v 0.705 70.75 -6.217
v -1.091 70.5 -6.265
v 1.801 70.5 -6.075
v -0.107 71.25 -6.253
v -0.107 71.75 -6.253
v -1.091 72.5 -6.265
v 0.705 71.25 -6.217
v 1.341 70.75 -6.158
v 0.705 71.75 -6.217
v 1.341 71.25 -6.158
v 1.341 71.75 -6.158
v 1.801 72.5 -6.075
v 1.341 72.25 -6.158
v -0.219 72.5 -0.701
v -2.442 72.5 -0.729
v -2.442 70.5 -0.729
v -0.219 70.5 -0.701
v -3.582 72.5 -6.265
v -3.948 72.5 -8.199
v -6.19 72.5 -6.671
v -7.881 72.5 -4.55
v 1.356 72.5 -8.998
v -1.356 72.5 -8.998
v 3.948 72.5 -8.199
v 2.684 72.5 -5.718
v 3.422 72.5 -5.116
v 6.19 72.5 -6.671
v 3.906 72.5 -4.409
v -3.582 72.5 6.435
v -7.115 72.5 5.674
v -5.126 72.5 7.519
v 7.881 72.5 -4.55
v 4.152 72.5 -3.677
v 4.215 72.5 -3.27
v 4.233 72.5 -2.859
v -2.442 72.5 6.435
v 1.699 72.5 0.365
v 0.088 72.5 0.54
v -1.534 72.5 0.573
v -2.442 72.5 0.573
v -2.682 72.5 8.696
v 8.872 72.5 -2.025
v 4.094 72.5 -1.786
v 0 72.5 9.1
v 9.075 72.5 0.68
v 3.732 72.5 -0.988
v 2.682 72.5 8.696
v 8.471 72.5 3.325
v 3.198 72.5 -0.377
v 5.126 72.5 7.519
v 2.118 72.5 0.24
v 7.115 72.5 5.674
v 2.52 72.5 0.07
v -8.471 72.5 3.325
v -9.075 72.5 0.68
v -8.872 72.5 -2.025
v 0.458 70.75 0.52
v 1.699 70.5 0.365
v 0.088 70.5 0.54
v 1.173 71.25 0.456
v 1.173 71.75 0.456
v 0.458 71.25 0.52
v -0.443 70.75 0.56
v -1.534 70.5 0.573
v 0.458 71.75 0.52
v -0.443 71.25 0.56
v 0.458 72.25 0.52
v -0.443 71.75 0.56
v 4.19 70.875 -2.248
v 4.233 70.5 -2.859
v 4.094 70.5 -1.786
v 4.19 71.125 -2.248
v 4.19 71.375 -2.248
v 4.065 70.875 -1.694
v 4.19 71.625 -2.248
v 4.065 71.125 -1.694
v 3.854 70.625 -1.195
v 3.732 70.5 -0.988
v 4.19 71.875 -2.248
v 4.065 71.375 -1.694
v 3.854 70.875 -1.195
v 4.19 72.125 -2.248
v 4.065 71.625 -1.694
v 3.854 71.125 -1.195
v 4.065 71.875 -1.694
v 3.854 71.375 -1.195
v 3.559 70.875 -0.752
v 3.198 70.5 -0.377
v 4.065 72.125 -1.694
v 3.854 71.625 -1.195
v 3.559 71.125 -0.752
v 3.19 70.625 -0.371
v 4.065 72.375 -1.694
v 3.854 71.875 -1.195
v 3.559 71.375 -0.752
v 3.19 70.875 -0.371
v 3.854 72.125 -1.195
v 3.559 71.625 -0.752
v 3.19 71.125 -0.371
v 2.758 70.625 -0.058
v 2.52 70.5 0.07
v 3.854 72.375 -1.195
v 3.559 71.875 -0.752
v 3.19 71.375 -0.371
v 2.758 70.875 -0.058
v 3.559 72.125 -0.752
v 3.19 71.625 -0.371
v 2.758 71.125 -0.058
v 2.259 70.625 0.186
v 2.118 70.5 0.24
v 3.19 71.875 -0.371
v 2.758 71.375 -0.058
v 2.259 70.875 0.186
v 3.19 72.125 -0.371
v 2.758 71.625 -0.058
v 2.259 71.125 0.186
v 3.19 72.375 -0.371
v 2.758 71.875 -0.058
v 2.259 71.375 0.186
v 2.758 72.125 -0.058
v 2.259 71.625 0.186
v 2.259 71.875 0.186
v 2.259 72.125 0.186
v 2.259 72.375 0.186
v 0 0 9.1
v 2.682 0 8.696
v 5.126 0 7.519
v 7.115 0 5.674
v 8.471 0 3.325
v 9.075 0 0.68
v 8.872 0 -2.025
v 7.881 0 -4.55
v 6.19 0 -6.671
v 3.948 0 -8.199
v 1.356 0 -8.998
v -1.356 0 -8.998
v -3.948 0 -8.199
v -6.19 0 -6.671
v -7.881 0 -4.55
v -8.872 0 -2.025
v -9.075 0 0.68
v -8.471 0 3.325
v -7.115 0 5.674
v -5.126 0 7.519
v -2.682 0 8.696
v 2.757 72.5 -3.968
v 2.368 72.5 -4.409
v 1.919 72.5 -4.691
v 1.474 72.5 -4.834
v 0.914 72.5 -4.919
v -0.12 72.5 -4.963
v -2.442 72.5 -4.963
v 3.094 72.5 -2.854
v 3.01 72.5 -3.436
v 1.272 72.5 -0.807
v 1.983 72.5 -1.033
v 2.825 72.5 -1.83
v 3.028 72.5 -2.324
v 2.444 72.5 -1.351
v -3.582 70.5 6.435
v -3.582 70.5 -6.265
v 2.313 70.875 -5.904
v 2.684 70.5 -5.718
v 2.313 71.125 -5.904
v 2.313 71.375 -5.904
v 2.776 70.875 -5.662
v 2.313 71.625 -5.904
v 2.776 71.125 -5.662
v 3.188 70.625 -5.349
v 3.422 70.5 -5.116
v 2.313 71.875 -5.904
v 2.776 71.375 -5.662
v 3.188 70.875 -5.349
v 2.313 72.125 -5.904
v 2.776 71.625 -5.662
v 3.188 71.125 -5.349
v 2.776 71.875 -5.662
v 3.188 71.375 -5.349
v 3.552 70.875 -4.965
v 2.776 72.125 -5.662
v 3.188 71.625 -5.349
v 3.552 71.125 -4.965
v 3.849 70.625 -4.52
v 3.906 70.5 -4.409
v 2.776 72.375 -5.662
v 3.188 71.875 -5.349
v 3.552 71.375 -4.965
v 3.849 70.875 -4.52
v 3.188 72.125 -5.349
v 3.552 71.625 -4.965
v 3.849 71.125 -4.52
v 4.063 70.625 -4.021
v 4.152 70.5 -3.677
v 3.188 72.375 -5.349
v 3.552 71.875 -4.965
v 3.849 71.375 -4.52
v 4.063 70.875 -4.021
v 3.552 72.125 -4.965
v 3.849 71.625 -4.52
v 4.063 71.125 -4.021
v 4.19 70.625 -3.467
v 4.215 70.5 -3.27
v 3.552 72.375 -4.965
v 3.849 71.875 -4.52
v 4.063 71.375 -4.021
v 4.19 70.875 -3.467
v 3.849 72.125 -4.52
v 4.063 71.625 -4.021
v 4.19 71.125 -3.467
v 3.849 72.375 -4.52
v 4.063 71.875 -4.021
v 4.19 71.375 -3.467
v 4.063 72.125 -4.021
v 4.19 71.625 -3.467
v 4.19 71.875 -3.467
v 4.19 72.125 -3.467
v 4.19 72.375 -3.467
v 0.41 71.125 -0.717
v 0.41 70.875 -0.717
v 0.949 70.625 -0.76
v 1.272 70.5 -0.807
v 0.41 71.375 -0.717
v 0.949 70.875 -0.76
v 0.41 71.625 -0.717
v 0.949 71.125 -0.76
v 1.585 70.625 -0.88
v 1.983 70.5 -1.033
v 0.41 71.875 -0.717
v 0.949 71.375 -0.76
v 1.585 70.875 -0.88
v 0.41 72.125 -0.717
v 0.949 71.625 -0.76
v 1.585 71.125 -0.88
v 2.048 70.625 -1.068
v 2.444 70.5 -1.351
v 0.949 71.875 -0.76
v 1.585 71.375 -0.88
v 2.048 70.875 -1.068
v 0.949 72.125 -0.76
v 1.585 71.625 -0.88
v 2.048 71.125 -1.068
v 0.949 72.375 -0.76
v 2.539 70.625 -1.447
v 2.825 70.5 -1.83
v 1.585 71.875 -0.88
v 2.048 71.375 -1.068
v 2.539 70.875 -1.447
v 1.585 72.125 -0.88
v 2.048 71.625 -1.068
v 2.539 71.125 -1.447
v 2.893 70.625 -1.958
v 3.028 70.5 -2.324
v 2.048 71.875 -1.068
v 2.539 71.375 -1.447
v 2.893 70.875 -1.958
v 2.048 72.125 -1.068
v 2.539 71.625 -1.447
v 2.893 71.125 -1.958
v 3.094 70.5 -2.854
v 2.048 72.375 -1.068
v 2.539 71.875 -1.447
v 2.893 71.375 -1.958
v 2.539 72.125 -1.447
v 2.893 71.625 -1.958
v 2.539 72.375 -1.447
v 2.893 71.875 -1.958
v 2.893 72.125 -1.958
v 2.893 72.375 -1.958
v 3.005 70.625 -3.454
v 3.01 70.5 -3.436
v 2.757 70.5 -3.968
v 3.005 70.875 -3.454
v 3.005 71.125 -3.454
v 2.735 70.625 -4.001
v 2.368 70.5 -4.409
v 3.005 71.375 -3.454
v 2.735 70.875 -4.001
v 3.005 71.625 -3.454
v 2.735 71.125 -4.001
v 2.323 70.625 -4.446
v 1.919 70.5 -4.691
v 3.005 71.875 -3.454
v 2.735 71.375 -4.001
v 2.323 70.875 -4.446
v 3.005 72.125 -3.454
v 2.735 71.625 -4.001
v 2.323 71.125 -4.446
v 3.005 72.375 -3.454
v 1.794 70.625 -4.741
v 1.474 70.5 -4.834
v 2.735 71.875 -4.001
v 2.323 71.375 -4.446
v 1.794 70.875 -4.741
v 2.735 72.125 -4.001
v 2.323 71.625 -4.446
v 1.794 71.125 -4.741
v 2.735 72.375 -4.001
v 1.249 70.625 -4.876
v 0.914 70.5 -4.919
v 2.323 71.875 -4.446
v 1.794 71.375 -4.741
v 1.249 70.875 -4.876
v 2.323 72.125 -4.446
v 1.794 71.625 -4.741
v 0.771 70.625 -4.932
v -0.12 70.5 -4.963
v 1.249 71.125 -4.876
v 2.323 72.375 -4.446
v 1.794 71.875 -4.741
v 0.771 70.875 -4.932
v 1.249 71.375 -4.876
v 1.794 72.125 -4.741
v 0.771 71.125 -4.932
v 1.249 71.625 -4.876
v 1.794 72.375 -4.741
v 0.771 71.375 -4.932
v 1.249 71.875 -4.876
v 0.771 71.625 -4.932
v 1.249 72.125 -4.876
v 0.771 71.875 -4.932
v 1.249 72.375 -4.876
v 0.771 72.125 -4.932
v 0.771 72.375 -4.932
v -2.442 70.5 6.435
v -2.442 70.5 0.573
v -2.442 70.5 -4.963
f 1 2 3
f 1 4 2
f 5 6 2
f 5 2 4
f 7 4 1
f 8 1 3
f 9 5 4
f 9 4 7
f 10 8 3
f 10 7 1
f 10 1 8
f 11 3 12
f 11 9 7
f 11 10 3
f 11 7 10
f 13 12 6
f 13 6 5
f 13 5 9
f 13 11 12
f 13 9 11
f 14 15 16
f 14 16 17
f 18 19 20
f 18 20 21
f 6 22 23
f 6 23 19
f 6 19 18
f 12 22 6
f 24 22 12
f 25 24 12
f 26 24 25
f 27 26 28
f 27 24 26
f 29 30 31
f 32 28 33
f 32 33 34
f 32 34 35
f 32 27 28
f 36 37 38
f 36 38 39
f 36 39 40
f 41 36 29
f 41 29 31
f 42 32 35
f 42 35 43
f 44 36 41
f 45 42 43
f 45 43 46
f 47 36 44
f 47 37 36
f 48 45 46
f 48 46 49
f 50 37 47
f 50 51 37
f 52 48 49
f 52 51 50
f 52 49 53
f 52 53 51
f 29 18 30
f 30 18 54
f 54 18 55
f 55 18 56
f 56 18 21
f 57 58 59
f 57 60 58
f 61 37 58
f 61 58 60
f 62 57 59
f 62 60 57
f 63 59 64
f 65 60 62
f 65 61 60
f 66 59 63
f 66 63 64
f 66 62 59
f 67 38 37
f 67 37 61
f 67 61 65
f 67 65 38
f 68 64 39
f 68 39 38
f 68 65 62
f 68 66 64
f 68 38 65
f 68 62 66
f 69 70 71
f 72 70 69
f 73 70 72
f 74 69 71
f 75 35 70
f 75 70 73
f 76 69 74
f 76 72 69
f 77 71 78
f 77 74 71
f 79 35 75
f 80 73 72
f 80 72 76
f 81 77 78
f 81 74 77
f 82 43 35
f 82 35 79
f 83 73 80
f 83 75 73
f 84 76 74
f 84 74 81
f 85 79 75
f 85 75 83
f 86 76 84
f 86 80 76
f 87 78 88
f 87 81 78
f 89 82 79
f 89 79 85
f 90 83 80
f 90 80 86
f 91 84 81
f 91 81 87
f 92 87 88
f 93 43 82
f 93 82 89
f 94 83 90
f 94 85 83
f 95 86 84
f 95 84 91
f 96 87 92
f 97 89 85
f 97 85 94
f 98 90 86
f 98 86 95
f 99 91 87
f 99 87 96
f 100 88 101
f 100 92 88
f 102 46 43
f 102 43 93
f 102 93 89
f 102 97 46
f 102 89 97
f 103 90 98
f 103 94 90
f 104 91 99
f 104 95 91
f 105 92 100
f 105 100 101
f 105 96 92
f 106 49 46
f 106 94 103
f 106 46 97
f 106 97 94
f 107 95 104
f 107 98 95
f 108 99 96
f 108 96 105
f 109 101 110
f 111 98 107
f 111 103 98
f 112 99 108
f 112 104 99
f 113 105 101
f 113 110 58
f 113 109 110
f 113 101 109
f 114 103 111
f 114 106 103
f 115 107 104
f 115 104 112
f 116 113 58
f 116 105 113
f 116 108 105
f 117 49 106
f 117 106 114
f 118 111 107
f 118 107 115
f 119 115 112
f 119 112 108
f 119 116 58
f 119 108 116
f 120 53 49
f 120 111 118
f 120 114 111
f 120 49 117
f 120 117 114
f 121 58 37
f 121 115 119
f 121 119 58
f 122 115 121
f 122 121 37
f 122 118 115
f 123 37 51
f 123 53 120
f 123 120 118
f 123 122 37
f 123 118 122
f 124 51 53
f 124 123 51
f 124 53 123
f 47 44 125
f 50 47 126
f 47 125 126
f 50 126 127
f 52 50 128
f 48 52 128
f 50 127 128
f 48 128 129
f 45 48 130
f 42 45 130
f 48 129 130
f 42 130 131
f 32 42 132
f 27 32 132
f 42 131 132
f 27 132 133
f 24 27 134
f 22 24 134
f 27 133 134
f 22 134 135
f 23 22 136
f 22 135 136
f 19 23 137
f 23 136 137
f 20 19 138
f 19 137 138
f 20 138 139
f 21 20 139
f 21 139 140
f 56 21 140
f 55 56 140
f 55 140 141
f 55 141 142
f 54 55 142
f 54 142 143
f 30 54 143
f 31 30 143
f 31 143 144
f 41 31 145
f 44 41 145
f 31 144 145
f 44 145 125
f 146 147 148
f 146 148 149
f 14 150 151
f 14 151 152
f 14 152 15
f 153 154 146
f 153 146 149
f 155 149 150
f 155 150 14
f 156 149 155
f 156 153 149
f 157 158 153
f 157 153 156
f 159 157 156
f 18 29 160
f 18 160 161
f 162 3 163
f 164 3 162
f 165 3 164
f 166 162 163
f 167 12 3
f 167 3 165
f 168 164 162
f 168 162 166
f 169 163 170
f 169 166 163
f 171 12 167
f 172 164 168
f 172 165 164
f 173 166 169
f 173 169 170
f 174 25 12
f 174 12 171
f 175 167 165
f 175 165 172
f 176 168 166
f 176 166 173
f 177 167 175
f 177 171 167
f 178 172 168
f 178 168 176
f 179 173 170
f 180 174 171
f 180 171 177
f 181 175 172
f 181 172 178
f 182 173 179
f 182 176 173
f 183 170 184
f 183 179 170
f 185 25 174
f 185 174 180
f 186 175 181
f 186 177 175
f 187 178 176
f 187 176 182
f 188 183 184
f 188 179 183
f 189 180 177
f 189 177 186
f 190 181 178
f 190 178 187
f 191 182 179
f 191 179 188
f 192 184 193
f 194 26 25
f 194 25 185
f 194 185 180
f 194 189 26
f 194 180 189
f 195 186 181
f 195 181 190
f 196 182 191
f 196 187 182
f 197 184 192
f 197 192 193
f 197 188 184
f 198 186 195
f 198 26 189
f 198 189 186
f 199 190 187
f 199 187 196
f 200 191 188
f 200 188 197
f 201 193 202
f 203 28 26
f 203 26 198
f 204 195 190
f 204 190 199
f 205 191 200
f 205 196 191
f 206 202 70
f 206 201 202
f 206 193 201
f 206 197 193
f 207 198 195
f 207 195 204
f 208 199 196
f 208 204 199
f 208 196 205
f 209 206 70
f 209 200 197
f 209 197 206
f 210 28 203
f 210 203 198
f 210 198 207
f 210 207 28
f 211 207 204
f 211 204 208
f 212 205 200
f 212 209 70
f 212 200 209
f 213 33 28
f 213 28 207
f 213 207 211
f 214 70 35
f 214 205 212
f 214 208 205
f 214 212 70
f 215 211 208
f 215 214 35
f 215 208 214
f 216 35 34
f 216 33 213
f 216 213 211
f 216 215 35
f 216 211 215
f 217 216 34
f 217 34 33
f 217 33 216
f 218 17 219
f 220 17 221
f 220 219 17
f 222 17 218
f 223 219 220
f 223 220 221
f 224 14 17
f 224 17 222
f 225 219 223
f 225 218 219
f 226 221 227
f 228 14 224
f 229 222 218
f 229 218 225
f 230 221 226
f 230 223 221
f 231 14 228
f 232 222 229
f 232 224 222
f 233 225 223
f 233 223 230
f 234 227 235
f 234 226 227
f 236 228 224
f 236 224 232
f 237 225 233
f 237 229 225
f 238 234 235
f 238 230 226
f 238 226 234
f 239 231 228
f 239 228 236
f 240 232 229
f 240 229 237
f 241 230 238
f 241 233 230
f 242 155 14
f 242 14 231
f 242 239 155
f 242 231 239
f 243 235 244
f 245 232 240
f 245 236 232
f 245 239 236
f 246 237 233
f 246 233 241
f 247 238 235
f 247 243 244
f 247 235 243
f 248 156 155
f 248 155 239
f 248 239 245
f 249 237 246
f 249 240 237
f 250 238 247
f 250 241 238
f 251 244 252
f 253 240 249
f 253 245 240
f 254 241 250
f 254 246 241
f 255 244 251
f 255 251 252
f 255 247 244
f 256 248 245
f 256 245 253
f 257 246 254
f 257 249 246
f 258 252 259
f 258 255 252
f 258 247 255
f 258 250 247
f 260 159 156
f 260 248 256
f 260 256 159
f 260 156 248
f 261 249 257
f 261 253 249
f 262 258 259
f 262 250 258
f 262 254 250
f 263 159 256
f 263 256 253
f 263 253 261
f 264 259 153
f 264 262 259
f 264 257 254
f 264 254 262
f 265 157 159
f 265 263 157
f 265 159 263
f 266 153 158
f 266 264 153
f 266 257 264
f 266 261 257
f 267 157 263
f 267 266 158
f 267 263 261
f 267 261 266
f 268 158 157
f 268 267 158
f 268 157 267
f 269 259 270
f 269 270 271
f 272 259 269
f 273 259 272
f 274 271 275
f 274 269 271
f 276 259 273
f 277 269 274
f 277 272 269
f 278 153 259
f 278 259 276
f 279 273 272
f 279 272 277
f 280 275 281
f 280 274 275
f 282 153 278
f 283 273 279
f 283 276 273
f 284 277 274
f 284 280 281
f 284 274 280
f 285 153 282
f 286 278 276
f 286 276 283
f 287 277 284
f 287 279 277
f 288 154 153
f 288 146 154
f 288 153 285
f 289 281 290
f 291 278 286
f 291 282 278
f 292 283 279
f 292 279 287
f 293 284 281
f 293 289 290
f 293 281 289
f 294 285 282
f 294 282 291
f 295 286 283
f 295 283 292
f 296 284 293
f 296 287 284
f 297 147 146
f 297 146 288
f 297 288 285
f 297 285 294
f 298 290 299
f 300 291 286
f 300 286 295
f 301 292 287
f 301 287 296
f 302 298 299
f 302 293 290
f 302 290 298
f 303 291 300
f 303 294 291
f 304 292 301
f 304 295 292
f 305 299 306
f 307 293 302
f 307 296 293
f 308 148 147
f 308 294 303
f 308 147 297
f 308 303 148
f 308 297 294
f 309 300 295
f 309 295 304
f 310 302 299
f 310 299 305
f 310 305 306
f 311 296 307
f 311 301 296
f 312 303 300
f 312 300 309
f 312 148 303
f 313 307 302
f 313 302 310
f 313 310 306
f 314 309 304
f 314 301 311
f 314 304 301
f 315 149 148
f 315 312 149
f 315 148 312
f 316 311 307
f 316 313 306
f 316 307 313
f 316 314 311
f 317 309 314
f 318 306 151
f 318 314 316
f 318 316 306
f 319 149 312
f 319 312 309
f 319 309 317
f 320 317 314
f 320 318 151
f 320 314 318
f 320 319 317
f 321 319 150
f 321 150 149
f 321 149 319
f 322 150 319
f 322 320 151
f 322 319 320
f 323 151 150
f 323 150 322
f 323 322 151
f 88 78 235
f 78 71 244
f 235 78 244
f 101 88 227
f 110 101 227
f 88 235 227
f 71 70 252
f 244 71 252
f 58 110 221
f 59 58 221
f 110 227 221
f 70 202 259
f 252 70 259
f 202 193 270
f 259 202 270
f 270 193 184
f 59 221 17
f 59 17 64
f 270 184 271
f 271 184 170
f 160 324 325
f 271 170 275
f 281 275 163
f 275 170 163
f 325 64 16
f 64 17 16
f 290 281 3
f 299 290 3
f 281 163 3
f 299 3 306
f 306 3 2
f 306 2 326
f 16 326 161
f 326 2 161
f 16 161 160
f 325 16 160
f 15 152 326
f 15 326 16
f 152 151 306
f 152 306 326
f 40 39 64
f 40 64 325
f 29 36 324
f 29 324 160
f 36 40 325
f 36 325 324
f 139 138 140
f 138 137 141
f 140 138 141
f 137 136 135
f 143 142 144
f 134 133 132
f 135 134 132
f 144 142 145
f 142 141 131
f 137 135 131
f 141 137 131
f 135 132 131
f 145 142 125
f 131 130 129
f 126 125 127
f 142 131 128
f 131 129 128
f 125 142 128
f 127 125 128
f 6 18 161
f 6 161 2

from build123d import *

# Parameters (mm, degrees)
SKETCH1_R           = 9.1
BOSS_EXTRUDE1_DEPTH = 72.5
CUT_EXTRUDE2_DEPTH  = 2


with BuildPart() as part:
    # Sketch1 → Boss-Extrude1 (new body)
    with BuildSketch(Plane(origin=(0, 0, 0), x_dir=(1, 0, 0), z_dir=(0, 1, 0))):
        with Locations(Location((0, 0, 0), (0, 0, 270))):
            Circle(SKETCH1_R)
    extrude(amount=BOSS_EXTRUDE1_DEPTH)

    # Sketch3 → Cut-Extrude2 (cut)
    with BuildSketch(Plane(origin=(0, 72.5, 0), x_dir=(1, 0, 0), z_dir=(0, 1, 0))):
        with BuildLine():
            Line((-3.582051282, 6.265328291), (-1.09140625, 6.265328291))
            add(Edge.make_bspline(
                [(-1.09140625, 6.265328291), (-0.920098105, 6.265139982), (-0.591864091, 6.264779173), (-0.121183746, 6.253839953), (0.30629728, 6.239228813), (0.689657234, 6.218974515), (1.030075647, 6.195038316), (1.326012134, 6.16146663), (1.57979281, 6.126413557), (1.731853355, 6.090775882), (1.801201923, 6.074523003)],
                knots=[0, 0, 0, 0, 1.415646017, 2.712440637, 3.8905458, 4.950247383, 5.884950622, 6.709939814, 7.411656543, 8, 8, 8, 8], degree=3))
            add(Edge.make_bspline(
                [(1.801201923, 6.074523003), (1.888989889, 6.050494785), (2.062497206, 6.003004544), (2.312509562, 5.907886176), (2.550376373, 5.795102319), (2.776913742, 5.666564023), (2.989337872, 5.516756405), (3.190818078, 5.351752134), (3.379576292, 5.167741586), (3.554551057, 4.966788615), (3.715241608, 4.752266711), (3.853597886, 4.520973477), (3.969448109, 4.276802176), (4.068810266, 4.019922646), (4.140323801, 3.748177758), (4.194196837, 3.463455687), (4.228391143, 3.165786954), (4.231666153, 2.962369721), (4.233333333, 2.858817875)],
                knots=[0, 0, 0, 0, 0.999701418, 1.975846123, 2.934577507, 3.890451536, 4.834027766, 5.787354733, 6.749476667, 7.726910423, 8.712836071, 9.690891519, 10.682875813, 11.679750201, 12.712814741, 13.765529915, 14.8625177, 16, 16, 16, 16], degree=3))
            add(Edge.make_bspline(
                [(4.233333333, 2.858817875), (4.231804164, 2.754395656), (4.22881224, 2.550086532), (4.192902862, 2.251190987), (4.144533309, 1.965555685), (4.070158291, 1.693813965), (3.972746848, 1.437579598), (3.858475685, 1.192936842), (3.720649732, 0.964047747), (3.56228135, 0.750081349), (3.386108422, 0.55083681), (3.192876332, 0.367757984), (2.983365185, 0.201916527), (2.758240819, 0.052940652), (2.51530851, -0.075714991), (2.258252696, -0.19094864), (1.984839053, -0.287726489), (1.795636217, -0.338635569), (1.699439103, -0.364519465)],
                knots=[0, 0, 0, 0, 1.121902311, 2.195077645, 3.232258892, 4.234102512, 5.217864754, 6.176164875, 7.132989551, 8.084763148, 9.034132444, 9.988522005, 10.94243251, 11.903244335, 12.886203696, 13.894208494, 14.929344452, 16, 16, 16, 16], degree=3))
            add(Edge.make_bspline(
                [(1.699439103, -0.364519465), (1.619874205, -0.381439425), (1.445503106, -0.418520501), (1.158328085, -0.459916902), (0.823971971, -0.495250481), (0.442891126, -0.52174318), (0.015427614, -0.544423089), (-0.458649805, -0.562450172), (-0.980271743, -0.572355642), (-1.344113114, -0.572866519), (-1.534074519, -0.573133247)],
                knots=[0, 0, 0, 0, 0.601384939, 1.31797006, 2.144135048, 3.087295005, 4.142315834, 5.309527816, 6.595305764, 8, 8, 8, 8], degree=3))
            Line((-1.534074519, -0.573133247), (-2.442307692, -0.573133247))
            Line((-2.442307692, -0.573133247), (-2.442307692, -6.434671709))
            Line((-2.442307692, -6.434671709), (-3.582051282, -6.434671709))
            Line((-3.582051282, -6.434671709), (-3.582051282, 6.265328291))
        make_face()
        with BuildLine():
            Line((-2.442307692, 4.962764189), (-2.442307692, 0.729430855))
            Line((-2.442307692, 0.729430855), (-0.218790064, 0.70144608))
            add(Edge.make_bspline(
                [(-0.218790064, 0.70144608), (-0.110223476, 0.701389969), (0.099362084, 0.701281648), (0.402116379, 0.715742316), (0.683001508, 0.732435678), (0.941154681, 0.756877457), (1.176692272, 0.79142602), (1.39000702, 0.826302898), (1.579444875, 0.876759499), (1.801147692, 0.944697493), (2.048192982, 1.06056727), (2.316952372, 1.228751156), (2.544719928, 1.443129726), (2.741817748, 1.684167857), (2.898230505, 1.952316127), (3.012733677, 2.239223411), (3.080011591, 2.541947322), (3.089032922, 2.749095712), (3.093589744, 2.853729734)],
                knots=[0, 0, 0, 0, 1.160613943, 2.240541288, 3.23993089, 4.169200891, 5.011653406, 5.7853311, 6.478053781, 7.106038997, 8.262395093, 9.384106736, 10.481365981, 11.59014053, 12.70357646, 13.786202915, 14.881775077, 16, 16, 16, 16], degree=3))
            add(Edge.make_bspline(
                [(3.093589744, 2.853729734), (3.089008141, 2.955832339), (3.079900481, 3.158799683), (3.012206349, 3.456265472), (2.898453124, 3.740149313), (2.740767767, 4.004937366), (2.54939281, 4.245108169), (2.326963765, 4.453740601), (2.074004216, 4.621459351), (1.838697778, 4.729711545), (1.62968776, 4.795806973), (1.44814322, 4.842052537), (1.243162773, 4.878975451), (1.014679687, 4.908873075), (0.76446489, 4.934467063), (0.490368719, 4.951833323), (0.193429499, 4.961998607), (-0.012711715, 4.962502816), (-0.119571314, 4.962764189)],
                knots=[0, 0, 0, 0, 1.120700087, 2.227813068, 3.331159281, 4.466773991, 5.599788987, 6.693661531, 7.80175334, 8.91857717, 9.525282508, 10.207424825, 10.974604443, 11.810962634, 12.737642355, 13.736264703, 14.826523623, 16, 16, 16, 16], degree=3))
            Line((-0.119571314, 4.962764189), (-2.442307692, 4.962764189))
        make_face(mode=Mode.SUBTRACT)
    extrude(amount=-CUT_EXTRUDE2_DEPTH, mode=Mode.SUBTRACT)


solid = part.part
